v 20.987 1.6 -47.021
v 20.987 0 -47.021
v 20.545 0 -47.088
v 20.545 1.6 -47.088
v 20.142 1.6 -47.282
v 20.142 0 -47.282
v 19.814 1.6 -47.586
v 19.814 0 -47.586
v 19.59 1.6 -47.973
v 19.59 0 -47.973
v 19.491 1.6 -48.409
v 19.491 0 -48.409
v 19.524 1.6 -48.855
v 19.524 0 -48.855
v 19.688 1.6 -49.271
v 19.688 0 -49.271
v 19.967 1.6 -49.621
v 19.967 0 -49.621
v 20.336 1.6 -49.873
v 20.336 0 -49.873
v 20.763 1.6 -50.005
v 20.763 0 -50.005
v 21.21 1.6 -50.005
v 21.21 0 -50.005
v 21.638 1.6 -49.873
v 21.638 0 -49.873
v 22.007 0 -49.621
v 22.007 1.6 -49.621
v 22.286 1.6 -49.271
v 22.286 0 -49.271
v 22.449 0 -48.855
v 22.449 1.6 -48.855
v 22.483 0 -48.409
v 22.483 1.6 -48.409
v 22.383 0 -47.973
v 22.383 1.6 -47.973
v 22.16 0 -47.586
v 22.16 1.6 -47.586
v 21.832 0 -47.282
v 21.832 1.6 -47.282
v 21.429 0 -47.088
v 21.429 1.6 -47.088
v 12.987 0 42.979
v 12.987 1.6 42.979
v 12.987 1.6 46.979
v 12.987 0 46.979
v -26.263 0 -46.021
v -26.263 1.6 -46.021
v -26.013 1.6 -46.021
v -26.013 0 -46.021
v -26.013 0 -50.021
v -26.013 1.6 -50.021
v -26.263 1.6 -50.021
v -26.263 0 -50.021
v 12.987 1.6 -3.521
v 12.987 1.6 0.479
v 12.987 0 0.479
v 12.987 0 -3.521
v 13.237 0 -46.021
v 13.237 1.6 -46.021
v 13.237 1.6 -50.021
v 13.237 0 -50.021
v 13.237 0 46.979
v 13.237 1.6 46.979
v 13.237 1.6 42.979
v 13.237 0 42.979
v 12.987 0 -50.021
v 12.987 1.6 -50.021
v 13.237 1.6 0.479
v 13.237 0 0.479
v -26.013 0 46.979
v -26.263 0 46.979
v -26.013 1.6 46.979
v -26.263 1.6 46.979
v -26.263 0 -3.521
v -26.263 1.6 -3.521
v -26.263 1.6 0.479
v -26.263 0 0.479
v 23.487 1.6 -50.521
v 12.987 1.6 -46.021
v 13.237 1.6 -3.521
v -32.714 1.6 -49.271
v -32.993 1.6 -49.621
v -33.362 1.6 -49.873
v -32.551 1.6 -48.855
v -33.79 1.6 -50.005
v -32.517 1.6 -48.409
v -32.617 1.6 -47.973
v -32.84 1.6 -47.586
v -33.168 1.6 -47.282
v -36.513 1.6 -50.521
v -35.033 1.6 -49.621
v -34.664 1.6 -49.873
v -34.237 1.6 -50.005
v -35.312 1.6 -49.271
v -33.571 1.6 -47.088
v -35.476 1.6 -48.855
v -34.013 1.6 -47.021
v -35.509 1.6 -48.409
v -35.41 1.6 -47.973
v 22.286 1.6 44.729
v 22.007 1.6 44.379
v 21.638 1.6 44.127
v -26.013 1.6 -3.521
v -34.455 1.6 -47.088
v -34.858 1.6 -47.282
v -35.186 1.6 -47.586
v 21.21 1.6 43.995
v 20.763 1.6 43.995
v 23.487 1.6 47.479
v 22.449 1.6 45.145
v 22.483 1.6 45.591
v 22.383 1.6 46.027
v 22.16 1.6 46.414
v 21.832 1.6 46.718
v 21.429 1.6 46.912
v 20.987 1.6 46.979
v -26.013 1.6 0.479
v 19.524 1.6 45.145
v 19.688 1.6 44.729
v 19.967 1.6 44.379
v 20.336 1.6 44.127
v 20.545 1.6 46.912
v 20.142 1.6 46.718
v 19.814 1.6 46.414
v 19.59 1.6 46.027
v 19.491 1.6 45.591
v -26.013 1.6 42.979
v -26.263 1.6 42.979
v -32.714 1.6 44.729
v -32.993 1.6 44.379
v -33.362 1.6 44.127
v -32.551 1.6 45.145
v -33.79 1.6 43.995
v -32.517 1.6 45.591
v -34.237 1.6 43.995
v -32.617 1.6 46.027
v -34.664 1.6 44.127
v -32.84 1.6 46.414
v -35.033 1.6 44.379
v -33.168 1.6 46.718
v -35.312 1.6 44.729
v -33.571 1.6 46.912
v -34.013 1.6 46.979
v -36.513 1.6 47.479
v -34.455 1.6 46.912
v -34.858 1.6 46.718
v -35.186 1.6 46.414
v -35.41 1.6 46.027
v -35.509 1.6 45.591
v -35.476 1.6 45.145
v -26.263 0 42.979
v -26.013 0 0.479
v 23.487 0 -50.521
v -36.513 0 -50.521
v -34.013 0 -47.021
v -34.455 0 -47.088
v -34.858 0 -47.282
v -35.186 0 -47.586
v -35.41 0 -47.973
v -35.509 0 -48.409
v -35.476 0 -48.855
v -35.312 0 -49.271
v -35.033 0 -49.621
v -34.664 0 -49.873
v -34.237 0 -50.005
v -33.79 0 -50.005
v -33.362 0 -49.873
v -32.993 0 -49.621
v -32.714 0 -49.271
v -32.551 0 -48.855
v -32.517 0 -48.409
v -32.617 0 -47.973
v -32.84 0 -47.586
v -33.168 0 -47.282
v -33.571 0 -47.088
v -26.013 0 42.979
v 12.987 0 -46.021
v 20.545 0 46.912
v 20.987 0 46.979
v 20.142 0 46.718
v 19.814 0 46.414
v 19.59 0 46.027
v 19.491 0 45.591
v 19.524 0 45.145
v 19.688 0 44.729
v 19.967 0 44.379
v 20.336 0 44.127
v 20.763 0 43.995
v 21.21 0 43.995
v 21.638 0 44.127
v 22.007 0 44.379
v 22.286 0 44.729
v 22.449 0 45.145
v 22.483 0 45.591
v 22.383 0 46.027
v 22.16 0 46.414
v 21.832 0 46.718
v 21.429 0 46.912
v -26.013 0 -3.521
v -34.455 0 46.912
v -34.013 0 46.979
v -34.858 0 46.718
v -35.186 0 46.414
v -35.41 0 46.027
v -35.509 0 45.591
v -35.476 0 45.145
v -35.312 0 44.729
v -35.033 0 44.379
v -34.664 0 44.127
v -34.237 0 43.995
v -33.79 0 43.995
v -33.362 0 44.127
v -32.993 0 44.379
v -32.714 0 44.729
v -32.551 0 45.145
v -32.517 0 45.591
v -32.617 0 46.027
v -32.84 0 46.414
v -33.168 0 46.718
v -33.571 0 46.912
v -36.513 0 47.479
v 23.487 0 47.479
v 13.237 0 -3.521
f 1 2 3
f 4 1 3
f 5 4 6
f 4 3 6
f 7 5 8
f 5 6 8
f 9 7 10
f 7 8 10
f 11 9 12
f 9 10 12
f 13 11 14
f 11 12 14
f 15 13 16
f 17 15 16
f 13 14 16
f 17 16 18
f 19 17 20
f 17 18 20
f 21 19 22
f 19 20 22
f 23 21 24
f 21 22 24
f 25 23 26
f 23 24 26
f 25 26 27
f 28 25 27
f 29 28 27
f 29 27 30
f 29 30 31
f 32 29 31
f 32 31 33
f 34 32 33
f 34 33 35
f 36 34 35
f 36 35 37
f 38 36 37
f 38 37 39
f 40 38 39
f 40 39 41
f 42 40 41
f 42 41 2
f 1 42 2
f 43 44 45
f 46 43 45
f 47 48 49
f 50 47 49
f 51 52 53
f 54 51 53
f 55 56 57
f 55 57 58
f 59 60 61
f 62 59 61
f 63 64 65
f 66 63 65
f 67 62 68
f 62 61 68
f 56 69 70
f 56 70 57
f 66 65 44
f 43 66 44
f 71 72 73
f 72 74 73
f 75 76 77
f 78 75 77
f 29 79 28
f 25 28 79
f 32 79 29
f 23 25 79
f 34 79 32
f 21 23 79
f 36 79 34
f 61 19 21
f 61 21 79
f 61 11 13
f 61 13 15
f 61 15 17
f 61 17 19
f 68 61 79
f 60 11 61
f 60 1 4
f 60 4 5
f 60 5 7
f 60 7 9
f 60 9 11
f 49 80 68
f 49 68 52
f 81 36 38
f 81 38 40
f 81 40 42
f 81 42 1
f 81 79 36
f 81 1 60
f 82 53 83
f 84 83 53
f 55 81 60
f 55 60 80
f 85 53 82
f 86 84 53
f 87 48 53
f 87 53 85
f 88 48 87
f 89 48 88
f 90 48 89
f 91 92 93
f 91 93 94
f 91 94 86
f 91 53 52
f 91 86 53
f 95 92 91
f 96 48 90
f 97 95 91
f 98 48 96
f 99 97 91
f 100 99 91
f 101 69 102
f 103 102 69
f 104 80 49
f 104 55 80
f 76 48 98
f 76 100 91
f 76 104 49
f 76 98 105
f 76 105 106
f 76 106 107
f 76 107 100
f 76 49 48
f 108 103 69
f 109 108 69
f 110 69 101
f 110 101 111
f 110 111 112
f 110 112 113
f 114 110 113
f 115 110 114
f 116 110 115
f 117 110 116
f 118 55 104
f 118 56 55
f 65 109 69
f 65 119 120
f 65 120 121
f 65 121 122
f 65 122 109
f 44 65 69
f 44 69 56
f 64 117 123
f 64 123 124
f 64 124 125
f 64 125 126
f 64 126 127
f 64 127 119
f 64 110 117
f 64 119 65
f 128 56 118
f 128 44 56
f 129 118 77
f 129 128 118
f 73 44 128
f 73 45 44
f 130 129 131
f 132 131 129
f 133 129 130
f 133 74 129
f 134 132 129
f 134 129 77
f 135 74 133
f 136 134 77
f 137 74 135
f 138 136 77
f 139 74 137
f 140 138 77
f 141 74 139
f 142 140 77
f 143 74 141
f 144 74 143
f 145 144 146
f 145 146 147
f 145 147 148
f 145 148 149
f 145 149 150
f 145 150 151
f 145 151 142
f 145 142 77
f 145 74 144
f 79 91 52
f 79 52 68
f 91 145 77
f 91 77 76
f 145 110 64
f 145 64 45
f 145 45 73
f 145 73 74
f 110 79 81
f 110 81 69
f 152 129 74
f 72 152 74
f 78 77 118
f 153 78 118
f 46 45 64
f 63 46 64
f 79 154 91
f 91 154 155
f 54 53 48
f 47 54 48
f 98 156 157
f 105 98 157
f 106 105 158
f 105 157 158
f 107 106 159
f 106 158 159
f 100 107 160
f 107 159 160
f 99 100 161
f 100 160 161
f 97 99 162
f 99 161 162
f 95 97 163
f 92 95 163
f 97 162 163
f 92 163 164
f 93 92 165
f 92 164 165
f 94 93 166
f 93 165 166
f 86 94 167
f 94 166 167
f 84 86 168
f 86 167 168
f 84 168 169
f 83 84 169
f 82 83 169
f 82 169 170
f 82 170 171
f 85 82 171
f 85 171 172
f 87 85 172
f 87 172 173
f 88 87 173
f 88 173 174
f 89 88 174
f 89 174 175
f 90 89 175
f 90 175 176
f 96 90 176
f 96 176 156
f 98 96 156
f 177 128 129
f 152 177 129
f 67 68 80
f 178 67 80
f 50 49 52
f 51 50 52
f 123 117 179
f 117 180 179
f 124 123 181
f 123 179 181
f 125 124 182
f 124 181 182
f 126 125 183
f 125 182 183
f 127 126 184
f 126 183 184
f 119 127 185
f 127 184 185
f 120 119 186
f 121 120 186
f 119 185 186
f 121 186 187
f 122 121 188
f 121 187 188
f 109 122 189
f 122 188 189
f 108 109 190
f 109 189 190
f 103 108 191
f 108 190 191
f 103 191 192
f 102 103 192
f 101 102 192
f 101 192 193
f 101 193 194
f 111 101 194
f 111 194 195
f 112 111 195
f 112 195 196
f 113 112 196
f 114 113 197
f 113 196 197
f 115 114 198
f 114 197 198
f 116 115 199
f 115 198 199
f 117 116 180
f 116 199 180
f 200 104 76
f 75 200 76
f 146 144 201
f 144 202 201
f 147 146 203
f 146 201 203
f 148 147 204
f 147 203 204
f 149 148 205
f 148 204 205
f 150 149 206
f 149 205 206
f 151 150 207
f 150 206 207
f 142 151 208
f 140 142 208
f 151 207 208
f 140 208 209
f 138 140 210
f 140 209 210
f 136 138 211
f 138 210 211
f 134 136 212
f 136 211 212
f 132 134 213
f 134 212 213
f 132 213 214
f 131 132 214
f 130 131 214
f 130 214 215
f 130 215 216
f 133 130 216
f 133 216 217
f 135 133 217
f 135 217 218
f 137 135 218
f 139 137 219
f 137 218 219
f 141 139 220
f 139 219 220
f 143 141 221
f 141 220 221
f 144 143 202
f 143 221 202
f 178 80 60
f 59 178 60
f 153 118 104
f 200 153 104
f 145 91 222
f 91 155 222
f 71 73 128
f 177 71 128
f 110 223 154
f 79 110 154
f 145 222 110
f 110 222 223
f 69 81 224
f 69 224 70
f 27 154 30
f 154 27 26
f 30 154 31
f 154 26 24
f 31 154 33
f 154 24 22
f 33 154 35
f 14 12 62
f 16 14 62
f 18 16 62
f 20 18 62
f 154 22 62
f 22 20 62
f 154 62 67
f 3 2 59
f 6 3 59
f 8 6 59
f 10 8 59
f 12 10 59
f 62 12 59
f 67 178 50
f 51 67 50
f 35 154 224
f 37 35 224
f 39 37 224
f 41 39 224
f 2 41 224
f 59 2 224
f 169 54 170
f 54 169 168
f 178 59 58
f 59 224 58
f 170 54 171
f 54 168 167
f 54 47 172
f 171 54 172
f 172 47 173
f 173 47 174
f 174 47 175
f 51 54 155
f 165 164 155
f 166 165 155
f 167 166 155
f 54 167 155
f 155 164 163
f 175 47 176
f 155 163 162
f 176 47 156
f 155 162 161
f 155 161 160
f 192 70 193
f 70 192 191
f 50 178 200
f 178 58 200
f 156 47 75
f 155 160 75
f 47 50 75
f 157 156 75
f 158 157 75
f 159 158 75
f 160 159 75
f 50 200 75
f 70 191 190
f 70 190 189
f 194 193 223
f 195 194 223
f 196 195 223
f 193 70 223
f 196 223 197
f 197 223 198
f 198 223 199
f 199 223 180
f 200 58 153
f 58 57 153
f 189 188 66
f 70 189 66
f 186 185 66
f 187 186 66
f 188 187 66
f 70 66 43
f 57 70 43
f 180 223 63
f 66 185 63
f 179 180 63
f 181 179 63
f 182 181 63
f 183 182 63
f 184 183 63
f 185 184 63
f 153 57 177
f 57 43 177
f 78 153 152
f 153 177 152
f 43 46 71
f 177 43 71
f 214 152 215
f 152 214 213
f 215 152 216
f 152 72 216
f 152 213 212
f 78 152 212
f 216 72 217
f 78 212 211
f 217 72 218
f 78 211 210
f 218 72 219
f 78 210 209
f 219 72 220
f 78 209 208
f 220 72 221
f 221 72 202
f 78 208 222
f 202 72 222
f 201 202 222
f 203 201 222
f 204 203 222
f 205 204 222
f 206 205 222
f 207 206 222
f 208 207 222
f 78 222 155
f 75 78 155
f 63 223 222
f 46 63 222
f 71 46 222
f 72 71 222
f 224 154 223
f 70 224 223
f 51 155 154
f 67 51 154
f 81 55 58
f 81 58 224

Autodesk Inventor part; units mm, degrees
ref_plane "YZ Plane" through (0, 0, 0) normal (1, 0, 0) x (0, 1, 0)
ref_plane "XZ Plane" through (0, 0, 0) normal (0, 1, 0) x (-1, 0, 0)
ref_plane "XY Plane" through (0, 0, 0) normal (0, 0, 1) x (1, 0, 0)
sketch "Sketch1" plane through (0, 0, 0) normal (0, 1, 0) x (-1, 0, 0)
  line L0 (36.5132, 47.4786) -> (-23.4868, 47.4786)
  line L1 (-23.4868, 47.4786) -> (-23.4868, -50.5214)
  line L2 (-23.4868, -50.5214) -> (36.5132, -50.5214)
  line L3 (36.5132, -50.5214) -> (36.5132, 47.4786)
  point P0 (0, 0)
  dimension "LCD_PCB_Width" = 98
  dimension "LCD_PCB_Height" = 60
extrude "Extrusion1" add sketch "Sketch1" along normal blind 1.6
sketch "Sketch2" plane through (0, 1.6, 0) normal (0, 1, 0) x (1, 0, 0)
  line L0 (-26.2632, -46.9786) -> (13.2368, -46.9786) construction
  line L1 (13.2368, -46.9786) -> (13.2368, 50.0214) construction
  line L2 (13.2368, 50.0214) -> (-26.2632, 50.0214) construction
  line L3 (-26.2632, 50.0214) -> (-26.2632, -46.9786) construction
  line L4 (-36.5132, 50.5214) -> (-36.5132, -47.4786) construction
  line L5 (-36.5132, 1.5214) -> (-26.2632, 1.5214) construction
  line L6 (13.2368, 1.5214) -> (23.4868, 1.5214) construction
  line L7 (23.4868, -47.4786) -> (23.4868, 50.5214) construction
  line L8 (-26.2632, -46.9786) -> (-26.0132, -46.9786)
  line L9 (-26.0132, -46.9786) -> (-26.0132, -42.9786)
  line L10 (-26.0132, -42.9786) -> (-26.2632, -42.9786)
  line L11 (-26.2632, -42.9786) -> (-26.2632, -46.9786)
  line L12 (-26.2632, -0.4786) -> (-26.0132, -0.4786)
  line L13 (-26.0132, -0.4786) -> (-26.0132, 3.5214)
  line L14 (-26.0132, 3.5214) -> (-26.2632, 3.5214)
  line L15 (-26.2632, 3.5214) -> (-26.2632, -0.4786)
  line L16 (-26.2632, 46.0214) -> (-26.0132, 46.0214)
  line L17 (-26.0132, 46.0214) -> (-26.0132, 50.0214)
  line L18 (-26.0132, 50.0214) -> (-26.2632, 50.0214)
  line L19 (-26.2632, 50.0214) -> (-26.2632, 46.0214)
  line L20 (12.9868, 46.0214) -> (13.2368, 46.0214)
  line L21 (13.2368, 46.0214) -> (13.2368, 50.0214)
  line L22 (13.2368, 50.0214) -> (12.9868, 50.0214)
  line L23 (12.9868, 50.0214) -> (12.9868, 46.0214)
  line L24 (12.9868, 3.5214) -> (13.2368, 3.5214)
  line L25 (13.2368, 3.5214) -> (13.2368, -0.4786)
  line L26 (13.2368, -0.4786) -> (12.9868, -0.4786)
  line L27 (12.9868, -0.4786) -> (12.9868, 3.5214)
  line L28 (12.9868, -46.9786) -> (13.2368, -46.9786)
  line L29 (13.2368, -46.9786) -> (13.2368, -42.9786)
  line L30 (13.2368, -42.9786) -> (12.9868, -42.9786)
  line L31 (12.9868, -42.9786) -> (12.9868, -46.9786)
  line L32 (-26.1382, -42.9786) -> (-26.1382, -0.4786) construction
  line L33 (-26.1382, 3.5214) -> (-26.1382, 46.0214) construction
  point P0 (0, 0)
  dimension "d4" = 39.5
  dimension "d5" = 97
  dimension "d6" = 0.25
  dimension "d7" = 4
extrude "Extrusion2" cut sketch "Sketch2" against normal blind 1.6
sketch "Sketch3" plane through (0, 1.6, 0) normal (0, 1, 0) x (1, 0, 0)
  line L0 (-36.5132, -47.4786) -> (23.4868, -47.4786) projected
  line L1 (-34.0132, -45.4786) -> (20.9868, -45.4786) construction
  line L2 (20.9868, -45.4786) -> (20.9868, 48.5214) construction
  line L3 (20.9868, 48.5214) -> (-34.0132, 48.5214) construction
  line L4 (-34.0132, 48.5214) -> (-34.0132, -45.4786) construction
  line L5 (23.4868, 50.5214) -> (-36.5132, 50.5214) construction
  line L6 (-36.5132, 50.5214) -> (-36.5132, -47.4786) construction
  point P0 (0, 0)
  dimension "LCD_PCB_Side_Hole_Offset" = 2
  dimension "LCD_PCB_Vertical_Hole_Spacing" = 55
  dimension "d12" = 2
  dimension "LCD_PCB_Top_Hole_Offset" = 2.5
  dimension "LCD_PCB_Horizontal_Hole_Spacing" = 94
hole "Hole1" at (-34.0132, 1.6, 45.4786) at (-34.0132, 1.6, -48.5214) at (20.9868, 1.6, -48.5214) at (20.9868, 1.6, 45.4786) direction (0, -1, 0) diameter 3 end through all
equation "\"d4\" = LCD_Screen_Height"
equation "\"d5\" = LCD_Screen_Width"
equation "\"d6\" = LCD_Screen_Tab_Width"
equation "\"d7\" = LCD_Screen_Tab_Length"
equation "\"d8\" = LCD_PCB_Thickness"
equation "\"d12\" = LCD_PCB_Side_Hole_Offset"
equation "\"LCD_Screen_Height\" = 39.5"
equation "\"LCD_Screen_Width\" = 97"
equation "\"LCD_Screen_Tab_Width\" = 0.25"
equation "\"LCD_Screen_Tab_Length\" = 4"
equation "\"LCD_PCB_Thickness\" = 1.6"
properties part number "LCD_PCB" material "Phenolic Resin"
